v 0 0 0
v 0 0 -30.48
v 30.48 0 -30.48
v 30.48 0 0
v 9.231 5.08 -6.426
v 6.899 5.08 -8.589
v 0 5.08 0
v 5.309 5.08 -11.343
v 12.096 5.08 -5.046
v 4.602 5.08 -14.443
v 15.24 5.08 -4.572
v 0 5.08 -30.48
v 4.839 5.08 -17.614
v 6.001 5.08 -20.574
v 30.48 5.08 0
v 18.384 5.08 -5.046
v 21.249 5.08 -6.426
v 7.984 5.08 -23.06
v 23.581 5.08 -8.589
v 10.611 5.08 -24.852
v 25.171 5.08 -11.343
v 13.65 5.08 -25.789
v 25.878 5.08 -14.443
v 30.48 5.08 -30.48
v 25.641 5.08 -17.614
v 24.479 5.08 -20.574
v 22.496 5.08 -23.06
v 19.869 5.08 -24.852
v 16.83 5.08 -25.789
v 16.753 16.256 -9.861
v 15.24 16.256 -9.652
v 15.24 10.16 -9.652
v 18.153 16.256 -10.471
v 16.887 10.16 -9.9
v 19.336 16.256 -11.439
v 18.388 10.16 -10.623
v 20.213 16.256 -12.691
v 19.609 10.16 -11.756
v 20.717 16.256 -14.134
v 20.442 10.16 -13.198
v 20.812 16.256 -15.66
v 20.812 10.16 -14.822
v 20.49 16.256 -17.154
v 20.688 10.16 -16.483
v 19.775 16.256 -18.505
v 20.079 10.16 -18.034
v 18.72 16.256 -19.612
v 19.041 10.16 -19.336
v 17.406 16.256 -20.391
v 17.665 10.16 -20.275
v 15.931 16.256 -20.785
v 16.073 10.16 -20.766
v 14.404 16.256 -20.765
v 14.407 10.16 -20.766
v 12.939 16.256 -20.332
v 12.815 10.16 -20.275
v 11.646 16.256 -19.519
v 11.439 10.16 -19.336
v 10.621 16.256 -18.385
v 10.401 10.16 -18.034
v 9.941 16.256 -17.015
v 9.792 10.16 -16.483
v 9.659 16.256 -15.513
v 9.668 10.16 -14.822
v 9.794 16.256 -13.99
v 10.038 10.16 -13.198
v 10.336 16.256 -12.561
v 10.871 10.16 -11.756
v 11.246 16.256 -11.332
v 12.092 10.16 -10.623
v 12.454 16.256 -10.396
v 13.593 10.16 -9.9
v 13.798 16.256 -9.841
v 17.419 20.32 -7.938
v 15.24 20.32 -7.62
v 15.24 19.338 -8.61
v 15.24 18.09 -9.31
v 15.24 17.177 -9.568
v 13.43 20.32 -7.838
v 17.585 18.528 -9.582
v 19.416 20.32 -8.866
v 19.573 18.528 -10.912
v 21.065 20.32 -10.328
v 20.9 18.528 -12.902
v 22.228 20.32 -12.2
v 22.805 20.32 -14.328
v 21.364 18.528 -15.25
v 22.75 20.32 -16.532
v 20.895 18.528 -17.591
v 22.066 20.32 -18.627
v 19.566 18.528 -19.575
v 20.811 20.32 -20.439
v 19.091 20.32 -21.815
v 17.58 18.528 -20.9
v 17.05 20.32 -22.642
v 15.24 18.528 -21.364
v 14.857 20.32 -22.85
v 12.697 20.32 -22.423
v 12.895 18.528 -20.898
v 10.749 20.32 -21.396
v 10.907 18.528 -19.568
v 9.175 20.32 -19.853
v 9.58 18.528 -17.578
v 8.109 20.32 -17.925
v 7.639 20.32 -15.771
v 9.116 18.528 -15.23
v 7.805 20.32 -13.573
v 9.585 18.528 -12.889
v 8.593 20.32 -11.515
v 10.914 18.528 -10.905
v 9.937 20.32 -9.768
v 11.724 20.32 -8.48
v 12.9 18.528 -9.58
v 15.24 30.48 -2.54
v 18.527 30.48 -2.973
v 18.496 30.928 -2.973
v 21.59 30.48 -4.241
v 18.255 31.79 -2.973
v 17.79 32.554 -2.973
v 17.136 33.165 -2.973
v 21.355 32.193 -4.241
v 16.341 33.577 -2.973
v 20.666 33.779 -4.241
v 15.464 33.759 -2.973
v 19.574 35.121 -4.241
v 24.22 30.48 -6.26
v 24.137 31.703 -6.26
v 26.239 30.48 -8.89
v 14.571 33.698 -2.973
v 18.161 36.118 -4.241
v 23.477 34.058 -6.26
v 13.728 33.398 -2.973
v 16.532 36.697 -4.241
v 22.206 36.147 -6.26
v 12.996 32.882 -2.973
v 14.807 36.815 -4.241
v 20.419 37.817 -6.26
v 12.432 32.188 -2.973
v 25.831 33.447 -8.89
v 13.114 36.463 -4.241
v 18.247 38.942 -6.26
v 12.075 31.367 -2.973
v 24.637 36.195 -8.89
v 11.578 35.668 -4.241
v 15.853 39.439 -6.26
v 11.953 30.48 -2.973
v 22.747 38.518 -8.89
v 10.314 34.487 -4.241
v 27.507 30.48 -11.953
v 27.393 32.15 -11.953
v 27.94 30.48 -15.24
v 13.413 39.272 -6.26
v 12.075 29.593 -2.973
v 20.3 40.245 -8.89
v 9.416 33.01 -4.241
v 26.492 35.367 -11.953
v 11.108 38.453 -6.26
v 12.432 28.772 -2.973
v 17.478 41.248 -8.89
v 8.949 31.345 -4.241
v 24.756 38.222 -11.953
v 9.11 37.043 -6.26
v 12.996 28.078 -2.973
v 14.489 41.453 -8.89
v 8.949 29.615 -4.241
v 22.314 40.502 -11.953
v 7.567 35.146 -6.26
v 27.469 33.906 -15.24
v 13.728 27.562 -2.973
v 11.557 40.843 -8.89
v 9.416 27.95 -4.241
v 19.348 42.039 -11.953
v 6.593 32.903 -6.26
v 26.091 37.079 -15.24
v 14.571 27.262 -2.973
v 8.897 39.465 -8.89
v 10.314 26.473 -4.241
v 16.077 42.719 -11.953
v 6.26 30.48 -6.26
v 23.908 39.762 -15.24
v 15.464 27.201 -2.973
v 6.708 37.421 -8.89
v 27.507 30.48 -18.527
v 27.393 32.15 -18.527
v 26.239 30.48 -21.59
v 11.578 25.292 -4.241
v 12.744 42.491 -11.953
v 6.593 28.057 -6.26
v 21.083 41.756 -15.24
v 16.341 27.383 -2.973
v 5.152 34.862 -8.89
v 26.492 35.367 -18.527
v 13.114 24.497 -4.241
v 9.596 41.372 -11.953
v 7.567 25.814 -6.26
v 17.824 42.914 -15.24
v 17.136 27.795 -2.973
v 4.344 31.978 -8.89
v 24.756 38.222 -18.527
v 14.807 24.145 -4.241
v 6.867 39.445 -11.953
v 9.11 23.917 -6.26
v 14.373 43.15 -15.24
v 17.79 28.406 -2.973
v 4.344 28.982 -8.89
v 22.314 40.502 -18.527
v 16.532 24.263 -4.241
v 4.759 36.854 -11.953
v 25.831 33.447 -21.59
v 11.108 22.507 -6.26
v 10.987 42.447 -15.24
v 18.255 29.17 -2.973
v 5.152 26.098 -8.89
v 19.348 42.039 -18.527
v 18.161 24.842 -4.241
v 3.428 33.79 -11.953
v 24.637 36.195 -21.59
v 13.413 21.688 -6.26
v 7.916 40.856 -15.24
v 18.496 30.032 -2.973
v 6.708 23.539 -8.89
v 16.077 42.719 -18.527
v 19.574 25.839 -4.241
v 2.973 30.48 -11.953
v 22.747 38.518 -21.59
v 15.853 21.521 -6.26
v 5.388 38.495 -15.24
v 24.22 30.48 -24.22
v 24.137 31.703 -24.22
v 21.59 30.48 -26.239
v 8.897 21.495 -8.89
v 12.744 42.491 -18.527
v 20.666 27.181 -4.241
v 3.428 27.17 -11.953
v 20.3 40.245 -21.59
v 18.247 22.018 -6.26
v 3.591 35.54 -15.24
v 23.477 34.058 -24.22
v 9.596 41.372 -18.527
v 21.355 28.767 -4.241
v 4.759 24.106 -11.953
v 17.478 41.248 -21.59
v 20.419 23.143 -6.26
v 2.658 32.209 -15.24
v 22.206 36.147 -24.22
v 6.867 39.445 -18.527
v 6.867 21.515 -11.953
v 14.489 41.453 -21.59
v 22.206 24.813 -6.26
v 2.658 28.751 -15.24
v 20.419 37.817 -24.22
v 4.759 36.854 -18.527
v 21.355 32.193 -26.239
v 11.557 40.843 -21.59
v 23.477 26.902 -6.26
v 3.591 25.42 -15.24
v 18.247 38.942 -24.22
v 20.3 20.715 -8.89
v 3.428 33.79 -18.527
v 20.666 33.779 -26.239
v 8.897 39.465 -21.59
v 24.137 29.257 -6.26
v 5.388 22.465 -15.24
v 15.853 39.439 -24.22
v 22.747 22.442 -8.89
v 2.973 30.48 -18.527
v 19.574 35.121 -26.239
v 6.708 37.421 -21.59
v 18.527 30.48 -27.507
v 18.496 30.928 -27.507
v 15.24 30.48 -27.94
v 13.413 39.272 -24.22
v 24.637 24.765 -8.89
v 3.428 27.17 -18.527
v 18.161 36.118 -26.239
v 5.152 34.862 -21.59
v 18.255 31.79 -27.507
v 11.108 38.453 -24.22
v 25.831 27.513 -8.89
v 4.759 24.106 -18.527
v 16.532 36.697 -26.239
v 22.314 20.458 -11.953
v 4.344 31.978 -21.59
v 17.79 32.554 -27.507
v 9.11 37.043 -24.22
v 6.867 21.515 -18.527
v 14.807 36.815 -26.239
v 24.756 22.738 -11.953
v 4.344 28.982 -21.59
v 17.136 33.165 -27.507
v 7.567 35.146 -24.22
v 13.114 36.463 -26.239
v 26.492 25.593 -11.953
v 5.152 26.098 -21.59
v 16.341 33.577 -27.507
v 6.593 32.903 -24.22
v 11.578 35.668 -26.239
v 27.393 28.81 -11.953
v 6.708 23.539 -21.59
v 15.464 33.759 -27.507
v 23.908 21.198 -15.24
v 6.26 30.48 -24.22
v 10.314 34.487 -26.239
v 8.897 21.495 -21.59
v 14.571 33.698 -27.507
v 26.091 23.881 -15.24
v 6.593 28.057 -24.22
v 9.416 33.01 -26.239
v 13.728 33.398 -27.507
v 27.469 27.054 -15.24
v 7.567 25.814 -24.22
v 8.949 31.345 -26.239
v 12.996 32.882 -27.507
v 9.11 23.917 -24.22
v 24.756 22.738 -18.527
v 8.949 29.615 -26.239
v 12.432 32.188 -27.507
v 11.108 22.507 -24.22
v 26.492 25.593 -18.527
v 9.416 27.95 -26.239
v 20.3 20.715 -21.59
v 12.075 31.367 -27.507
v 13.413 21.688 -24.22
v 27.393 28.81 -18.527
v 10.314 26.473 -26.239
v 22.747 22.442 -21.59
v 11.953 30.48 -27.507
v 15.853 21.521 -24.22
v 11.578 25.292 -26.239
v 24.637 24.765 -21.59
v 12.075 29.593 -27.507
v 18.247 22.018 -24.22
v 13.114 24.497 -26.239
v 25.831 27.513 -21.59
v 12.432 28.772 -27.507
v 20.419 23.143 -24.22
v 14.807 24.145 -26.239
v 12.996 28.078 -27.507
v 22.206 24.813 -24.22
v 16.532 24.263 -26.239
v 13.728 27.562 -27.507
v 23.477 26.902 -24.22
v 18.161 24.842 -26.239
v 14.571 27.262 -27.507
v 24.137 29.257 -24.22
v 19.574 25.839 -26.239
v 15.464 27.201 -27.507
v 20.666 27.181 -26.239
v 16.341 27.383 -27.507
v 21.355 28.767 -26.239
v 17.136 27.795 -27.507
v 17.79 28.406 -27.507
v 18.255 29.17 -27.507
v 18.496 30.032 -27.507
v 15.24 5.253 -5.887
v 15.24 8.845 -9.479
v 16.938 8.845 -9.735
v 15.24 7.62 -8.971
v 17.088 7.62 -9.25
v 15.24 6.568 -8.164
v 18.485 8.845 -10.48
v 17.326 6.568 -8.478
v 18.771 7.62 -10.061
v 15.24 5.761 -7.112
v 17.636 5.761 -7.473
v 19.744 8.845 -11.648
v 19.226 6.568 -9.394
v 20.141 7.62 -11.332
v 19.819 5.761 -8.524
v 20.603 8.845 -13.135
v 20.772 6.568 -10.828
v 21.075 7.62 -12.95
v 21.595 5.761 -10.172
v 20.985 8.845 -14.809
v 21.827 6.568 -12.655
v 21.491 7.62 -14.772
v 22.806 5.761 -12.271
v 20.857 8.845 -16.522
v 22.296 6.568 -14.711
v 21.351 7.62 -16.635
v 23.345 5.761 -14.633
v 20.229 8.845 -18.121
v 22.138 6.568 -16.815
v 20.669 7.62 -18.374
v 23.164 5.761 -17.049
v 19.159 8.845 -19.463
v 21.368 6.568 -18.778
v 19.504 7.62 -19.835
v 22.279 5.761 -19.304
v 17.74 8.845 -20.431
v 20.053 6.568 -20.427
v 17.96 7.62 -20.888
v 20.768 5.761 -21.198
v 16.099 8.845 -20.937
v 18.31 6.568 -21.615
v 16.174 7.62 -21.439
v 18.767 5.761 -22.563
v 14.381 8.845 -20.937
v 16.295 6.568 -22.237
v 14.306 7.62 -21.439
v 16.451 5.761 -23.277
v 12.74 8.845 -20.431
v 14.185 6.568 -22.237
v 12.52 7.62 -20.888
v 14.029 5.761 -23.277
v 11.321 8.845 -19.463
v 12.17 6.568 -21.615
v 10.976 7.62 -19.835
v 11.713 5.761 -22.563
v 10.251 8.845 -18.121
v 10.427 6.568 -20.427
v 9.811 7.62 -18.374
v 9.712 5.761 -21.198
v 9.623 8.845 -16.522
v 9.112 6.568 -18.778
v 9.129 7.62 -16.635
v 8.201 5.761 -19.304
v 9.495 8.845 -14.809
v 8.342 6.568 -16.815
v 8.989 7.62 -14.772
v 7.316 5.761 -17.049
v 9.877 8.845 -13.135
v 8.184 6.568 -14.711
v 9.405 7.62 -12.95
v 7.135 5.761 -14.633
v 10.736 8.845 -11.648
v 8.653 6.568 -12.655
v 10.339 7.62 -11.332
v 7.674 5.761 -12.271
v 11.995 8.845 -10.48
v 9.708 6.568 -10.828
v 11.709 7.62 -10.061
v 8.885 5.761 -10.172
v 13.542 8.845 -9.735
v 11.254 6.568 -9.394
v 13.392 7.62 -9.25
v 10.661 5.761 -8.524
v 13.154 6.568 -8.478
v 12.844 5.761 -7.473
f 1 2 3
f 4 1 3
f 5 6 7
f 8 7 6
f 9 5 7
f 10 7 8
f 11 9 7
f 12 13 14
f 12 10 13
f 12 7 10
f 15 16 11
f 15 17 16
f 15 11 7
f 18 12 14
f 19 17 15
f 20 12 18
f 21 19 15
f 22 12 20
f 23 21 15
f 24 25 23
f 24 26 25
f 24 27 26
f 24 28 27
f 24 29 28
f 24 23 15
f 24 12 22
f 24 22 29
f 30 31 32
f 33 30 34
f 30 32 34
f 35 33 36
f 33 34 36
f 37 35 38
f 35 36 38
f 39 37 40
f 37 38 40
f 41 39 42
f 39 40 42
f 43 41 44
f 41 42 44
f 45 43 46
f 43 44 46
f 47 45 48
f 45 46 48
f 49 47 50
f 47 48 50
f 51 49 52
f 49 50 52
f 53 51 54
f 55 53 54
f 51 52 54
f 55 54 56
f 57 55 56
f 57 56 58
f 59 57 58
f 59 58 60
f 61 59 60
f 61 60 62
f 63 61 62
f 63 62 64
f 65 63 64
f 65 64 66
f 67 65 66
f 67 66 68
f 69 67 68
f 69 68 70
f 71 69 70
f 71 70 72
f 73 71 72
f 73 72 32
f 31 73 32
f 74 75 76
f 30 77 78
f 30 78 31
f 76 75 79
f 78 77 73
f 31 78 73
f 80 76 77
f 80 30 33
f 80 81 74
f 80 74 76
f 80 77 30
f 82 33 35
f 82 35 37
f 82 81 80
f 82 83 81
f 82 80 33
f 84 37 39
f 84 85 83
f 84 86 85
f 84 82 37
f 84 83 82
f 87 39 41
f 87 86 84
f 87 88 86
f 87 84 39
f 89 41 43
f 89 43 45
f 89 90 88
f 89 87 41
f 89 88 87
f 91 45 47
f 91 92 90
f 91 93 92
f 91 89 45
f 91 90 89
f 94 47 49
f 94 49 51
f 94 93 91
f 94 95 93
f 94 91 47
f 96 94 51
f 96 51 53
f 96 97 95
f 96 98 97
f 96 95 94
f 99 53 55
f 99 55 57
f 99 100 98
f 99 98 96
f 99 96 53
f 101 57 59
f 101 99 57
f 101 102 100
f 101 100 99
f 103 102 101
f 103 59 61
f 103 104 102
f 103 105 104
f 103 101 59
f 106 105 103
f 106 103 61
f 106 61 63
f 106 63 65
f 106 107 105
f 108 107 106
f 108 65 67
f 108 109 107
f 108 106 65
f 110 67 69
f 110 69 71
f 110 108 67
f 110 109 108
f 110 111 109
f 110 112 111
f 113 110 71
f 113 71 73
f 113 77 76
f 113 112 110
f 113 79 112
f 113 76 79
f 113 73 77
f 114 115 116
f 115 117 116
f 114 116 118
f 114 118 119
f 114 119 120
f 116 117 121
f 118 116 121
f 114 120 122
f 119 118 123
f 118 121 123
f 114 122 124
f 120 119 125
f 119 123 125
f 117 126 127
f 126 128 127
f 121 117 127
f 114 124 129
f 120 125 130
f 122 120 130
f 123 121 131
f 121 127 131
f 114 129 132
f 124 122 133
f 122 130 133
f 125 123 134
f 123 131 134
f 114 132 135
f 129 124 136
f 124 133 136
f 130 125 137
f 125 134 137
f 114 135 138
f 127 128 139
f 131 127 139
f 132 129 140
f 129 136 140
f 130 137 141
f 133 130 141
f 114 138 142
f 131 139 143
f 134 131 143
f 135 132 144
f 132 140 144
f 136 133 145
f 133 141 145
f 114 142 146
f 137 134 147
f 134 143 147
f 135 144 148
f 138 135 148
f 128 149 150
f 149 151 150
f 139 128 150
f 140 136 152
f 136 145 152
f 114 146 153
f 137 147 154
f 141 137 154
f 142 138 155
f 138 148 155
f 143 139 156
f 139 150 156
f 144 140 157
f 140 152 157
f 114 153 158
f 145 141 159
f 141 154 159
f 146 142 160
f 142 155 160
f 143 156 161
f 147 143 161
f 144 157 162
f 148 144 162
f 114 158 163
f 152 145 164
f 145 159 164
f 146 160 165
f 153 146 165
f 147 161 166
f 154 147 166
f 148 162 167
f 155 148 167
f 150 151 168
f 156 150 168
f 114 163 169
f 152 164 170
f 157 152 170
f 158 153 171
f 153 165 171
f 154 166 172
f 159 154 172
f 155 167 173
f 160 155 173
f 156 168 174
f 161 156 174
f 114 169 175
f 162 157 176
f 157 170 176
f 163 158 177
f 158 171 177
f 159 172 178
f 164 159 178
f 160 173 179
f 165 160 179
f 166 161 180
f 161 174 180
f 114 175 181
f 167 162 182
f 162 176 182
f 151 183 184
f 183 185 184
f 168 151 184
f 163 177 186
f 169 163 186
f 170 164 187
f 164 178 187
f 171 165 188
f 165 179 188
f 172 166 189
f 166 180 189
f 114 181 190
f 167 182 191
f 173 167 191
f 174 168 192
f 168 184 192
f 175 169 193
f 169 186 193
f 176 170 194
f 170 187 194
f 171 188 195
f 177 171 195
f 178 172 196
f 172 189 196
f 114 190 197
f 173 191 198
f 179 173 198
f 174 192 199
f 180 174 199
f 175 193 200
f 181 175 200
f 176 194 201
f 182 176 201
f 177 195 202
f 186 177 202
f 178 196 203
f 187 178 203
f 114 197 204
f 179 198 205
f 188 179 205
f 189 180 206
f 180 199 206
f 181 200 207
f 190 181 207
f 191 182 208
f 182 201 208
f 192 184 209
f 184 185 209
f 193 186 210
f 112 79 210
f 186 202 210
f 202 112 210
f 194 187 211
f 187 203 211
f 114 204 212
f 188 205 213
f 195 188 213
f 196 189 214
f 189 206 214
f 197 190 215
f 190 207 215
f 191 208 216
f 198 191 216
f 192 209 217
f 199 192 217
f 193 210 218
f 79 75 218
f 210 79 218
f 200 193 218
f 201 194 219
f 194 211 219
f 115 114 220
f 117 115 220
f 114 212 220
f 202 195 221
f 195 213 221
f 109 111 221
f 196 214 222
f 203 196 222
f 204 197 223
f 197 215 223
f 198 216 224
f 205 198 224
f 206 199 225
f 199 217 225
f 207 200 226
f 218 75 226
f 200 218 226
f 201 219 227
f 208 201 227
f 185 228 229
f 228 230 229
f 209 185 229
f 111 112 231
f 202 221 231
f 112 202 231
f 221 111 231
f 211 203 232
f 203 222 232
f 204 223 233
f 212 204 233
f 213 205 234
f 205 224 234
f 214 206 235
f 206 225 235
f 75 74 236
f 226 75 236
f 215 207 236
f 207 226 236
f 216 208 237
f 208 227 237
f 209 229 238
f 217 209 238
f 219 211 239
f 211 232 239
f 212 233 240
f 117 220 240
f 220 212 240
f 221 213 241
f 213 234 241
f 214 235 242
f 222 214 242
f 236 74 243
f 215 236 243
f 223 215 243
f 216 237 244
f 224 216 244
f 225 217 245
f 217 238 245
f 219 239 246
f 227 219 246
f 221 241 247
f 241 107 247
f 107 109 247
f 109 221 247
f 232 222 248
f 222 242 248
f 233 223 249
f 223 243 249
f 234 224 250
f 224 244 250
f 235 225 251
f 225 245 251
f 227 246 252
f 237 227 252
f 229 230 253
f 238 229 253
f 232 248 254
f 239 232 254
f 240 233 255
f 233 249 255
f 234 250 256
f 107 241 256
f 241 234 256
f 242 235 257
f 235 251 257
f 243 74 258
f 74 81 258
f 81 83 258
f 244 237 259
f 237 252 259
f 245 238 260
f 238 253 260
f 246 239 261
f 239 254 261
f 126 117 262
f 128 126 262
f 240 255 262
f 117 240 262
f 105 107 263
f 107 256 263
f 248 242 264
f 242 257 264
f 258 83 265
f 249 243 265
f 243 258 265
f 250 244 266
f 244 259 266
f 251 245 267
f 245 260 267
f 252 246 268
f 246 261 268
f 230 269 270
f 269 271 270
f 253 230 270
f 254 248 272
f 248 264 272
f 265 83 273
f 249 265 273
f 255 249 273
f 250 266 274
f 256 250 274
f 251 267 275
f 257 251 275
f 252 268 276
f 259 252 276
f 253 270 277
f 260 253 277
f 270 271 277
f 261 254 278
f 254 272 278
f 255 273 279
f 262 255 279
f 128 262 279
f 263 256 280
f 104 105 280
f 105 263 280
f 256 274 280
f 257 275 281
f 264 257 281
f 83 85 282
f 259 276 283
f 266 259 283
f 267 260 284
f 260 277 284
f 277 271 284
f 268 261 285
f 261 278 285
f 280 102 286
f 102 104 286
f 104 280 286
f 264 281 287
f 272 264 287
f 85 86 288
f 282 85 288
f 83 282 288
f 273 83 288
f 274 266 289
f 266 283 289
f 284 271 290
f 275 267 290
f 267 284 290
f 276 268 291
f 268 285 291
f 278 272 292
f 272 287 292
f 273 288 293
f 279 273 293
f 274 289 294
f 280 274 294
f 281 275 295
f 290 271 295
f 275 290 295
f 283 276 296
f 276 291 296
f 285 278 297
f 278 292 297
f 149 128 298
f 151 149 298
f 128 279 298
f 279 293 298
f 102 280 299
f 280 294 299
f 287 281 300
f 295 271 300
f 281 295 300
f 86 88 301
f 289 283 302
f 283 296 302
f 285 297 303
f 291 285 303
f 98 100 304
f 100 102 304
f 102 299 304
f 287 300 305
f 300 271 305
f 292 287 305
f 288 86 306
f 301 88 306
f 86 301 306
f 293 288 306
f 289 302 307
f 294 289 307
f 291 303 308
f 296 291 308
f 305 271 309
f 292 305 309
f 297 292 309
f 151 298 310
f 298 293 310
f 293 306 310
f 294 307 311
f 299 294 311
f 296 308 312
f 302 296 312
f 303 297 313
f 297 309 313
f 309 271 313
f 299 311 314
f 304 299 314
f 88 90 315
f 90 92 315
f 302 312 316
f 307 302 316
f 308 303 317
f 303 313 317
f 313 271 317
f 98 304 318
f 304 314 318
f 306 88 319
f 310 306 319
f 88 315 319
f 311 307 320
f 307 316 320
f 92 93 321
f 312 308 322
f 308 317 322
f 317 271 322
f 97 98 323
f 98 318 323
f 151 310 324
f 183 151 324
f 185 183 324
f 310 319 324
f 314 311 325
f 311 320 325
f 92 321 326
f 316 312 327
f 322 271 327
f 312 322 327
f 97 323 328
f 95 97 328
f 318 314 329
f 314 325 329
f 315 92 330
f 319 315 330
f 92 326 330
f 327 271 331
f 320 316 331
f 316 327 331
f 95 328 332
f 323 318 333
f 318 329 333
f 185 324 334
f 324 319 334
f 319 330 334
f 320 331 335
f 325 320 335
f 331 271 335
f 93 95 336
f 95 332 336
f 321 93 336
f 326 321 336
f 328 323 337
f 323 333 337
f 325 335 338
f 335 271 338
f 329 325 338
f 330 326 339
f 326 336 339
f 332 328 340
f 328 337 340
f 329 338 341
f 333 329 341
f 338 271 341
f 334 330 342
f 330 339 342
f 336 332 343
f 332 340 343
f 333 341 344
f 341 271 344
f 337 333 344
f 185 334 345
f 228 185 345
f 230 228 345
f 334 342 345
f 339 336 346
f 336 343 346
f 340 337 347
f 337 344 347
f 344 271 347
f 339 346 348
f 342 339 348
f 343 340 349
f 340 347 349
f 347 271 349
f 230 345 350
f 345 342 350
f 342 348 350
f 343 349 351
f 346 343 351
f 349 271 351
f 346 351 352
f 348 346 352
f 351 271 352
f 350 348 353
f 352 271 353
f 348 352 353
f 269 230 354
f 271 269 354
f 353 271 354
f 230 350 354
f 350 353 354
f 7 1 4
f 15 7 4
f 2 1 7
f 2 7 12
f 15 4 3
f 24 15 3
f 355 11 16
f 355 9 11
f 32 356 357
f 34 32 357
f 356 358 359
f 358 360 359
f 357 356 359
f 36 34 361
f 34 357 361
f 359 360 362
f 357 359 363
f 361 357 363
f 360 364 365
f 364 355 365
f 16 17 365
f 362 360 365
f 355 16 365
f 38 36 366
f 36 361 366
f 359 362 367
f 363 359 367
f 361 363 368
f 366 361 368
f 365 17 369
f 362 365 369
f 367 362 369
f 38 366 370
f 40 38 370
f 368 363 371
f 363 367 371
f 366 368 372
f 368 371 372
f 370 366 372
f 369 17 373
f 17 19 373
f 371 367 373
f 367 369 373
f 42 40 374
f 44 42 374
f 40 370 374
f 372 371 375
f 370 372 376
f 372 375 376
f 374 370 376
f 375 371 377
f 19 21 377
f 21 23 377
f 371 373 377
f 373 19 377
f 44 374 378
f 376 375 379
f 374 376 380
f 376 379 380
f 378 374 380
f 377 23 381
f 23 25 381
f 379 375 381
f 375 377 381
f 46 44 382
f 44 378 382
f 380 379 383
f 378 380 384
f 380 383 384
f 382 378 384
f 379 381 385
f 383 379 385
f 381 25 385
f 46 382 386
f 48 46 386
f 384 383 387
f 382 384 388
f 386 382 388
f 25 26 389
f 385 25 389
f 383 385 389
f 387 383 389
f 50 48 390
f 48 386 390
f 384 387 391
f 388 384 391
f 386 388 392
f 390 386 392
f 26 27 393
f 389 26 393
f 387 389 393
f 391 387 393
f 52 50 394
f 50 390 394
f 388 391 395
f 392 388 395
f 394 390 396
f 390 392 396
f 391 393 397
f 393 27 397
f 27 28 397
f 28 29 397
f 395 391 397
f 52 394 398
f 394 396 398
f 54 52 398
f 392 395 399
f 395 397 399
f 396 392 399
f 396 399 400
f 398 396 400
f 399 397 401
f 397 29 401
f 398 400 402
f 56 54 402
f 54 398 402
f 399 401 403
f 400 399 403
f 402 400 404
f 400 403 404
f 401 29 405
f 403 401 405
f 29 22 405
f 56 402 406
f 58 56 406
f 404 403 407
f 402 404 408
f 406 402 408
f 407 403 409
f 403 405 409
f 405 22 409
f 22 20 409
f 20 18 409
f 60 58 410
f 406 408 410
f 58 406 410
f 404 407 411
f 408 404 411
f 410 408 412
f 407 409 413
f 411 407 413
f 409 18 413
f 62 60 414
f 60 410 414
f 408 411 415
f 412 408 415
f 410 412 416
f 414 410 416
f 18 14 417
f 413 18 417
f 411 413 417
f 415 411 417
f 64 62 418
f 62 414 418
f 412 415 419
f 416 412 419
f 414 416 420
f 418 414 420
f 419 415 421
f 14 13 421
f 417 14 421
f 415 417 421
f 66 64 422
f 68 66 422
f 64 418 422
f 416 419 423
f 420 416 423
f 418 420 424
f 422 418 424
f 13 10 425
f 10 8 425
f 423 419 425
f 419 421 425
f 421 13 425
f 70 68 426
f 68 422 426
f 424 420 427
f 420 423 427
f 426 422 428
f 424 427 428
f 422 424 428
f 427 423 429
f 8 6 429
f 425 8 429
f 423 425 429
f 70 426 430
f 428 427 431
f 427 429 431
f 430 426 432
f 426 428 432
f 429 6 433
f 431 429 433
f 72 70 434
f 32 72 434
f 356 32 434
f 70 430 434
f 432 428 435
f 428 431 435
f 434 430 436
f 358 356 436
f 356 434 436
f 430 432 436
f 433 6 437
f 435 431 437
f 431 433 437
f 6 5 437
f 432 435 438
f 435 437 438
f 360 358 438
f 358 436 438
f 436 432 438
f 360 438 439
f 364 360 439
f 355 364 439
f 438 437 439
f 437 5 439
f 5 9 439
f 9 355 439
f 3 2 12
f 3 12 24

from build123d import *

# Parameters (mm, degrees)
SKETCH2_W           = 30.48
SKETCH2_H           = 30.48
BOSS_EXTRUDE1_DEPTH = 5.08
SKETCH3_R           = 5.588
BOSS_EXTRUDE2_DEPTH = 25.4
FILLET1_R           = 5.08


with BuildPart() as part:
    # Sketch2 → Boss-Extrude1 (new body)
    with BuildSketch(Plane(origin=(0, 0, 0), x_dir=(1, 0, 0), z_dir=(0, 1, 0))):
        with Locations((15.24, 15.24)):
            Rectangle(SKETCH2_W, SKETCH2_H)
    extrude(amount=BOSS_EXTRUDE1_DEPTH)

    # Sketch3 → Boss-Extrude2 (add)
    with BuildSketch(Plane(origin=(0, 5.08, 0), x_dir=(1, 0, 0), z_dir=(0, 1, 0))):
        with Locations(Location((15.24, 15.24, 0), (0, 0, 270))):
            Circle(SKETCH3_R)
    extrude(amount=BOSS_EXTRUDE2_DEPTH)

    # Sketch6 → Revolve1 (revolve)
    with BuildSketch(Plane(origin=(0, 30.48, 0), x_dir=(1, 0, 0), z_dir=(0, 1, 0))):
        with BuildLine():
            Line((15.24, 27.94), (15.24, 2.54))
            ThreePointArc((15.24, 2.54), (27.94, 15.24), (15.24, 27.94))
        make_face()
    revolve(axis=Axis((15.24, 30.48, -27.94), (0, 0, 1)))

    # Fillet1
    fillet1_edges = [part.edges().sort_by_distance(p)[0] for p in [
        (15.24, 5.08, -20.828),
        (15.24, 19.075428285, -20.828),
    ]]
    fillet(fillet1_edges, radius=FILLET1_R)


solid = part.part
